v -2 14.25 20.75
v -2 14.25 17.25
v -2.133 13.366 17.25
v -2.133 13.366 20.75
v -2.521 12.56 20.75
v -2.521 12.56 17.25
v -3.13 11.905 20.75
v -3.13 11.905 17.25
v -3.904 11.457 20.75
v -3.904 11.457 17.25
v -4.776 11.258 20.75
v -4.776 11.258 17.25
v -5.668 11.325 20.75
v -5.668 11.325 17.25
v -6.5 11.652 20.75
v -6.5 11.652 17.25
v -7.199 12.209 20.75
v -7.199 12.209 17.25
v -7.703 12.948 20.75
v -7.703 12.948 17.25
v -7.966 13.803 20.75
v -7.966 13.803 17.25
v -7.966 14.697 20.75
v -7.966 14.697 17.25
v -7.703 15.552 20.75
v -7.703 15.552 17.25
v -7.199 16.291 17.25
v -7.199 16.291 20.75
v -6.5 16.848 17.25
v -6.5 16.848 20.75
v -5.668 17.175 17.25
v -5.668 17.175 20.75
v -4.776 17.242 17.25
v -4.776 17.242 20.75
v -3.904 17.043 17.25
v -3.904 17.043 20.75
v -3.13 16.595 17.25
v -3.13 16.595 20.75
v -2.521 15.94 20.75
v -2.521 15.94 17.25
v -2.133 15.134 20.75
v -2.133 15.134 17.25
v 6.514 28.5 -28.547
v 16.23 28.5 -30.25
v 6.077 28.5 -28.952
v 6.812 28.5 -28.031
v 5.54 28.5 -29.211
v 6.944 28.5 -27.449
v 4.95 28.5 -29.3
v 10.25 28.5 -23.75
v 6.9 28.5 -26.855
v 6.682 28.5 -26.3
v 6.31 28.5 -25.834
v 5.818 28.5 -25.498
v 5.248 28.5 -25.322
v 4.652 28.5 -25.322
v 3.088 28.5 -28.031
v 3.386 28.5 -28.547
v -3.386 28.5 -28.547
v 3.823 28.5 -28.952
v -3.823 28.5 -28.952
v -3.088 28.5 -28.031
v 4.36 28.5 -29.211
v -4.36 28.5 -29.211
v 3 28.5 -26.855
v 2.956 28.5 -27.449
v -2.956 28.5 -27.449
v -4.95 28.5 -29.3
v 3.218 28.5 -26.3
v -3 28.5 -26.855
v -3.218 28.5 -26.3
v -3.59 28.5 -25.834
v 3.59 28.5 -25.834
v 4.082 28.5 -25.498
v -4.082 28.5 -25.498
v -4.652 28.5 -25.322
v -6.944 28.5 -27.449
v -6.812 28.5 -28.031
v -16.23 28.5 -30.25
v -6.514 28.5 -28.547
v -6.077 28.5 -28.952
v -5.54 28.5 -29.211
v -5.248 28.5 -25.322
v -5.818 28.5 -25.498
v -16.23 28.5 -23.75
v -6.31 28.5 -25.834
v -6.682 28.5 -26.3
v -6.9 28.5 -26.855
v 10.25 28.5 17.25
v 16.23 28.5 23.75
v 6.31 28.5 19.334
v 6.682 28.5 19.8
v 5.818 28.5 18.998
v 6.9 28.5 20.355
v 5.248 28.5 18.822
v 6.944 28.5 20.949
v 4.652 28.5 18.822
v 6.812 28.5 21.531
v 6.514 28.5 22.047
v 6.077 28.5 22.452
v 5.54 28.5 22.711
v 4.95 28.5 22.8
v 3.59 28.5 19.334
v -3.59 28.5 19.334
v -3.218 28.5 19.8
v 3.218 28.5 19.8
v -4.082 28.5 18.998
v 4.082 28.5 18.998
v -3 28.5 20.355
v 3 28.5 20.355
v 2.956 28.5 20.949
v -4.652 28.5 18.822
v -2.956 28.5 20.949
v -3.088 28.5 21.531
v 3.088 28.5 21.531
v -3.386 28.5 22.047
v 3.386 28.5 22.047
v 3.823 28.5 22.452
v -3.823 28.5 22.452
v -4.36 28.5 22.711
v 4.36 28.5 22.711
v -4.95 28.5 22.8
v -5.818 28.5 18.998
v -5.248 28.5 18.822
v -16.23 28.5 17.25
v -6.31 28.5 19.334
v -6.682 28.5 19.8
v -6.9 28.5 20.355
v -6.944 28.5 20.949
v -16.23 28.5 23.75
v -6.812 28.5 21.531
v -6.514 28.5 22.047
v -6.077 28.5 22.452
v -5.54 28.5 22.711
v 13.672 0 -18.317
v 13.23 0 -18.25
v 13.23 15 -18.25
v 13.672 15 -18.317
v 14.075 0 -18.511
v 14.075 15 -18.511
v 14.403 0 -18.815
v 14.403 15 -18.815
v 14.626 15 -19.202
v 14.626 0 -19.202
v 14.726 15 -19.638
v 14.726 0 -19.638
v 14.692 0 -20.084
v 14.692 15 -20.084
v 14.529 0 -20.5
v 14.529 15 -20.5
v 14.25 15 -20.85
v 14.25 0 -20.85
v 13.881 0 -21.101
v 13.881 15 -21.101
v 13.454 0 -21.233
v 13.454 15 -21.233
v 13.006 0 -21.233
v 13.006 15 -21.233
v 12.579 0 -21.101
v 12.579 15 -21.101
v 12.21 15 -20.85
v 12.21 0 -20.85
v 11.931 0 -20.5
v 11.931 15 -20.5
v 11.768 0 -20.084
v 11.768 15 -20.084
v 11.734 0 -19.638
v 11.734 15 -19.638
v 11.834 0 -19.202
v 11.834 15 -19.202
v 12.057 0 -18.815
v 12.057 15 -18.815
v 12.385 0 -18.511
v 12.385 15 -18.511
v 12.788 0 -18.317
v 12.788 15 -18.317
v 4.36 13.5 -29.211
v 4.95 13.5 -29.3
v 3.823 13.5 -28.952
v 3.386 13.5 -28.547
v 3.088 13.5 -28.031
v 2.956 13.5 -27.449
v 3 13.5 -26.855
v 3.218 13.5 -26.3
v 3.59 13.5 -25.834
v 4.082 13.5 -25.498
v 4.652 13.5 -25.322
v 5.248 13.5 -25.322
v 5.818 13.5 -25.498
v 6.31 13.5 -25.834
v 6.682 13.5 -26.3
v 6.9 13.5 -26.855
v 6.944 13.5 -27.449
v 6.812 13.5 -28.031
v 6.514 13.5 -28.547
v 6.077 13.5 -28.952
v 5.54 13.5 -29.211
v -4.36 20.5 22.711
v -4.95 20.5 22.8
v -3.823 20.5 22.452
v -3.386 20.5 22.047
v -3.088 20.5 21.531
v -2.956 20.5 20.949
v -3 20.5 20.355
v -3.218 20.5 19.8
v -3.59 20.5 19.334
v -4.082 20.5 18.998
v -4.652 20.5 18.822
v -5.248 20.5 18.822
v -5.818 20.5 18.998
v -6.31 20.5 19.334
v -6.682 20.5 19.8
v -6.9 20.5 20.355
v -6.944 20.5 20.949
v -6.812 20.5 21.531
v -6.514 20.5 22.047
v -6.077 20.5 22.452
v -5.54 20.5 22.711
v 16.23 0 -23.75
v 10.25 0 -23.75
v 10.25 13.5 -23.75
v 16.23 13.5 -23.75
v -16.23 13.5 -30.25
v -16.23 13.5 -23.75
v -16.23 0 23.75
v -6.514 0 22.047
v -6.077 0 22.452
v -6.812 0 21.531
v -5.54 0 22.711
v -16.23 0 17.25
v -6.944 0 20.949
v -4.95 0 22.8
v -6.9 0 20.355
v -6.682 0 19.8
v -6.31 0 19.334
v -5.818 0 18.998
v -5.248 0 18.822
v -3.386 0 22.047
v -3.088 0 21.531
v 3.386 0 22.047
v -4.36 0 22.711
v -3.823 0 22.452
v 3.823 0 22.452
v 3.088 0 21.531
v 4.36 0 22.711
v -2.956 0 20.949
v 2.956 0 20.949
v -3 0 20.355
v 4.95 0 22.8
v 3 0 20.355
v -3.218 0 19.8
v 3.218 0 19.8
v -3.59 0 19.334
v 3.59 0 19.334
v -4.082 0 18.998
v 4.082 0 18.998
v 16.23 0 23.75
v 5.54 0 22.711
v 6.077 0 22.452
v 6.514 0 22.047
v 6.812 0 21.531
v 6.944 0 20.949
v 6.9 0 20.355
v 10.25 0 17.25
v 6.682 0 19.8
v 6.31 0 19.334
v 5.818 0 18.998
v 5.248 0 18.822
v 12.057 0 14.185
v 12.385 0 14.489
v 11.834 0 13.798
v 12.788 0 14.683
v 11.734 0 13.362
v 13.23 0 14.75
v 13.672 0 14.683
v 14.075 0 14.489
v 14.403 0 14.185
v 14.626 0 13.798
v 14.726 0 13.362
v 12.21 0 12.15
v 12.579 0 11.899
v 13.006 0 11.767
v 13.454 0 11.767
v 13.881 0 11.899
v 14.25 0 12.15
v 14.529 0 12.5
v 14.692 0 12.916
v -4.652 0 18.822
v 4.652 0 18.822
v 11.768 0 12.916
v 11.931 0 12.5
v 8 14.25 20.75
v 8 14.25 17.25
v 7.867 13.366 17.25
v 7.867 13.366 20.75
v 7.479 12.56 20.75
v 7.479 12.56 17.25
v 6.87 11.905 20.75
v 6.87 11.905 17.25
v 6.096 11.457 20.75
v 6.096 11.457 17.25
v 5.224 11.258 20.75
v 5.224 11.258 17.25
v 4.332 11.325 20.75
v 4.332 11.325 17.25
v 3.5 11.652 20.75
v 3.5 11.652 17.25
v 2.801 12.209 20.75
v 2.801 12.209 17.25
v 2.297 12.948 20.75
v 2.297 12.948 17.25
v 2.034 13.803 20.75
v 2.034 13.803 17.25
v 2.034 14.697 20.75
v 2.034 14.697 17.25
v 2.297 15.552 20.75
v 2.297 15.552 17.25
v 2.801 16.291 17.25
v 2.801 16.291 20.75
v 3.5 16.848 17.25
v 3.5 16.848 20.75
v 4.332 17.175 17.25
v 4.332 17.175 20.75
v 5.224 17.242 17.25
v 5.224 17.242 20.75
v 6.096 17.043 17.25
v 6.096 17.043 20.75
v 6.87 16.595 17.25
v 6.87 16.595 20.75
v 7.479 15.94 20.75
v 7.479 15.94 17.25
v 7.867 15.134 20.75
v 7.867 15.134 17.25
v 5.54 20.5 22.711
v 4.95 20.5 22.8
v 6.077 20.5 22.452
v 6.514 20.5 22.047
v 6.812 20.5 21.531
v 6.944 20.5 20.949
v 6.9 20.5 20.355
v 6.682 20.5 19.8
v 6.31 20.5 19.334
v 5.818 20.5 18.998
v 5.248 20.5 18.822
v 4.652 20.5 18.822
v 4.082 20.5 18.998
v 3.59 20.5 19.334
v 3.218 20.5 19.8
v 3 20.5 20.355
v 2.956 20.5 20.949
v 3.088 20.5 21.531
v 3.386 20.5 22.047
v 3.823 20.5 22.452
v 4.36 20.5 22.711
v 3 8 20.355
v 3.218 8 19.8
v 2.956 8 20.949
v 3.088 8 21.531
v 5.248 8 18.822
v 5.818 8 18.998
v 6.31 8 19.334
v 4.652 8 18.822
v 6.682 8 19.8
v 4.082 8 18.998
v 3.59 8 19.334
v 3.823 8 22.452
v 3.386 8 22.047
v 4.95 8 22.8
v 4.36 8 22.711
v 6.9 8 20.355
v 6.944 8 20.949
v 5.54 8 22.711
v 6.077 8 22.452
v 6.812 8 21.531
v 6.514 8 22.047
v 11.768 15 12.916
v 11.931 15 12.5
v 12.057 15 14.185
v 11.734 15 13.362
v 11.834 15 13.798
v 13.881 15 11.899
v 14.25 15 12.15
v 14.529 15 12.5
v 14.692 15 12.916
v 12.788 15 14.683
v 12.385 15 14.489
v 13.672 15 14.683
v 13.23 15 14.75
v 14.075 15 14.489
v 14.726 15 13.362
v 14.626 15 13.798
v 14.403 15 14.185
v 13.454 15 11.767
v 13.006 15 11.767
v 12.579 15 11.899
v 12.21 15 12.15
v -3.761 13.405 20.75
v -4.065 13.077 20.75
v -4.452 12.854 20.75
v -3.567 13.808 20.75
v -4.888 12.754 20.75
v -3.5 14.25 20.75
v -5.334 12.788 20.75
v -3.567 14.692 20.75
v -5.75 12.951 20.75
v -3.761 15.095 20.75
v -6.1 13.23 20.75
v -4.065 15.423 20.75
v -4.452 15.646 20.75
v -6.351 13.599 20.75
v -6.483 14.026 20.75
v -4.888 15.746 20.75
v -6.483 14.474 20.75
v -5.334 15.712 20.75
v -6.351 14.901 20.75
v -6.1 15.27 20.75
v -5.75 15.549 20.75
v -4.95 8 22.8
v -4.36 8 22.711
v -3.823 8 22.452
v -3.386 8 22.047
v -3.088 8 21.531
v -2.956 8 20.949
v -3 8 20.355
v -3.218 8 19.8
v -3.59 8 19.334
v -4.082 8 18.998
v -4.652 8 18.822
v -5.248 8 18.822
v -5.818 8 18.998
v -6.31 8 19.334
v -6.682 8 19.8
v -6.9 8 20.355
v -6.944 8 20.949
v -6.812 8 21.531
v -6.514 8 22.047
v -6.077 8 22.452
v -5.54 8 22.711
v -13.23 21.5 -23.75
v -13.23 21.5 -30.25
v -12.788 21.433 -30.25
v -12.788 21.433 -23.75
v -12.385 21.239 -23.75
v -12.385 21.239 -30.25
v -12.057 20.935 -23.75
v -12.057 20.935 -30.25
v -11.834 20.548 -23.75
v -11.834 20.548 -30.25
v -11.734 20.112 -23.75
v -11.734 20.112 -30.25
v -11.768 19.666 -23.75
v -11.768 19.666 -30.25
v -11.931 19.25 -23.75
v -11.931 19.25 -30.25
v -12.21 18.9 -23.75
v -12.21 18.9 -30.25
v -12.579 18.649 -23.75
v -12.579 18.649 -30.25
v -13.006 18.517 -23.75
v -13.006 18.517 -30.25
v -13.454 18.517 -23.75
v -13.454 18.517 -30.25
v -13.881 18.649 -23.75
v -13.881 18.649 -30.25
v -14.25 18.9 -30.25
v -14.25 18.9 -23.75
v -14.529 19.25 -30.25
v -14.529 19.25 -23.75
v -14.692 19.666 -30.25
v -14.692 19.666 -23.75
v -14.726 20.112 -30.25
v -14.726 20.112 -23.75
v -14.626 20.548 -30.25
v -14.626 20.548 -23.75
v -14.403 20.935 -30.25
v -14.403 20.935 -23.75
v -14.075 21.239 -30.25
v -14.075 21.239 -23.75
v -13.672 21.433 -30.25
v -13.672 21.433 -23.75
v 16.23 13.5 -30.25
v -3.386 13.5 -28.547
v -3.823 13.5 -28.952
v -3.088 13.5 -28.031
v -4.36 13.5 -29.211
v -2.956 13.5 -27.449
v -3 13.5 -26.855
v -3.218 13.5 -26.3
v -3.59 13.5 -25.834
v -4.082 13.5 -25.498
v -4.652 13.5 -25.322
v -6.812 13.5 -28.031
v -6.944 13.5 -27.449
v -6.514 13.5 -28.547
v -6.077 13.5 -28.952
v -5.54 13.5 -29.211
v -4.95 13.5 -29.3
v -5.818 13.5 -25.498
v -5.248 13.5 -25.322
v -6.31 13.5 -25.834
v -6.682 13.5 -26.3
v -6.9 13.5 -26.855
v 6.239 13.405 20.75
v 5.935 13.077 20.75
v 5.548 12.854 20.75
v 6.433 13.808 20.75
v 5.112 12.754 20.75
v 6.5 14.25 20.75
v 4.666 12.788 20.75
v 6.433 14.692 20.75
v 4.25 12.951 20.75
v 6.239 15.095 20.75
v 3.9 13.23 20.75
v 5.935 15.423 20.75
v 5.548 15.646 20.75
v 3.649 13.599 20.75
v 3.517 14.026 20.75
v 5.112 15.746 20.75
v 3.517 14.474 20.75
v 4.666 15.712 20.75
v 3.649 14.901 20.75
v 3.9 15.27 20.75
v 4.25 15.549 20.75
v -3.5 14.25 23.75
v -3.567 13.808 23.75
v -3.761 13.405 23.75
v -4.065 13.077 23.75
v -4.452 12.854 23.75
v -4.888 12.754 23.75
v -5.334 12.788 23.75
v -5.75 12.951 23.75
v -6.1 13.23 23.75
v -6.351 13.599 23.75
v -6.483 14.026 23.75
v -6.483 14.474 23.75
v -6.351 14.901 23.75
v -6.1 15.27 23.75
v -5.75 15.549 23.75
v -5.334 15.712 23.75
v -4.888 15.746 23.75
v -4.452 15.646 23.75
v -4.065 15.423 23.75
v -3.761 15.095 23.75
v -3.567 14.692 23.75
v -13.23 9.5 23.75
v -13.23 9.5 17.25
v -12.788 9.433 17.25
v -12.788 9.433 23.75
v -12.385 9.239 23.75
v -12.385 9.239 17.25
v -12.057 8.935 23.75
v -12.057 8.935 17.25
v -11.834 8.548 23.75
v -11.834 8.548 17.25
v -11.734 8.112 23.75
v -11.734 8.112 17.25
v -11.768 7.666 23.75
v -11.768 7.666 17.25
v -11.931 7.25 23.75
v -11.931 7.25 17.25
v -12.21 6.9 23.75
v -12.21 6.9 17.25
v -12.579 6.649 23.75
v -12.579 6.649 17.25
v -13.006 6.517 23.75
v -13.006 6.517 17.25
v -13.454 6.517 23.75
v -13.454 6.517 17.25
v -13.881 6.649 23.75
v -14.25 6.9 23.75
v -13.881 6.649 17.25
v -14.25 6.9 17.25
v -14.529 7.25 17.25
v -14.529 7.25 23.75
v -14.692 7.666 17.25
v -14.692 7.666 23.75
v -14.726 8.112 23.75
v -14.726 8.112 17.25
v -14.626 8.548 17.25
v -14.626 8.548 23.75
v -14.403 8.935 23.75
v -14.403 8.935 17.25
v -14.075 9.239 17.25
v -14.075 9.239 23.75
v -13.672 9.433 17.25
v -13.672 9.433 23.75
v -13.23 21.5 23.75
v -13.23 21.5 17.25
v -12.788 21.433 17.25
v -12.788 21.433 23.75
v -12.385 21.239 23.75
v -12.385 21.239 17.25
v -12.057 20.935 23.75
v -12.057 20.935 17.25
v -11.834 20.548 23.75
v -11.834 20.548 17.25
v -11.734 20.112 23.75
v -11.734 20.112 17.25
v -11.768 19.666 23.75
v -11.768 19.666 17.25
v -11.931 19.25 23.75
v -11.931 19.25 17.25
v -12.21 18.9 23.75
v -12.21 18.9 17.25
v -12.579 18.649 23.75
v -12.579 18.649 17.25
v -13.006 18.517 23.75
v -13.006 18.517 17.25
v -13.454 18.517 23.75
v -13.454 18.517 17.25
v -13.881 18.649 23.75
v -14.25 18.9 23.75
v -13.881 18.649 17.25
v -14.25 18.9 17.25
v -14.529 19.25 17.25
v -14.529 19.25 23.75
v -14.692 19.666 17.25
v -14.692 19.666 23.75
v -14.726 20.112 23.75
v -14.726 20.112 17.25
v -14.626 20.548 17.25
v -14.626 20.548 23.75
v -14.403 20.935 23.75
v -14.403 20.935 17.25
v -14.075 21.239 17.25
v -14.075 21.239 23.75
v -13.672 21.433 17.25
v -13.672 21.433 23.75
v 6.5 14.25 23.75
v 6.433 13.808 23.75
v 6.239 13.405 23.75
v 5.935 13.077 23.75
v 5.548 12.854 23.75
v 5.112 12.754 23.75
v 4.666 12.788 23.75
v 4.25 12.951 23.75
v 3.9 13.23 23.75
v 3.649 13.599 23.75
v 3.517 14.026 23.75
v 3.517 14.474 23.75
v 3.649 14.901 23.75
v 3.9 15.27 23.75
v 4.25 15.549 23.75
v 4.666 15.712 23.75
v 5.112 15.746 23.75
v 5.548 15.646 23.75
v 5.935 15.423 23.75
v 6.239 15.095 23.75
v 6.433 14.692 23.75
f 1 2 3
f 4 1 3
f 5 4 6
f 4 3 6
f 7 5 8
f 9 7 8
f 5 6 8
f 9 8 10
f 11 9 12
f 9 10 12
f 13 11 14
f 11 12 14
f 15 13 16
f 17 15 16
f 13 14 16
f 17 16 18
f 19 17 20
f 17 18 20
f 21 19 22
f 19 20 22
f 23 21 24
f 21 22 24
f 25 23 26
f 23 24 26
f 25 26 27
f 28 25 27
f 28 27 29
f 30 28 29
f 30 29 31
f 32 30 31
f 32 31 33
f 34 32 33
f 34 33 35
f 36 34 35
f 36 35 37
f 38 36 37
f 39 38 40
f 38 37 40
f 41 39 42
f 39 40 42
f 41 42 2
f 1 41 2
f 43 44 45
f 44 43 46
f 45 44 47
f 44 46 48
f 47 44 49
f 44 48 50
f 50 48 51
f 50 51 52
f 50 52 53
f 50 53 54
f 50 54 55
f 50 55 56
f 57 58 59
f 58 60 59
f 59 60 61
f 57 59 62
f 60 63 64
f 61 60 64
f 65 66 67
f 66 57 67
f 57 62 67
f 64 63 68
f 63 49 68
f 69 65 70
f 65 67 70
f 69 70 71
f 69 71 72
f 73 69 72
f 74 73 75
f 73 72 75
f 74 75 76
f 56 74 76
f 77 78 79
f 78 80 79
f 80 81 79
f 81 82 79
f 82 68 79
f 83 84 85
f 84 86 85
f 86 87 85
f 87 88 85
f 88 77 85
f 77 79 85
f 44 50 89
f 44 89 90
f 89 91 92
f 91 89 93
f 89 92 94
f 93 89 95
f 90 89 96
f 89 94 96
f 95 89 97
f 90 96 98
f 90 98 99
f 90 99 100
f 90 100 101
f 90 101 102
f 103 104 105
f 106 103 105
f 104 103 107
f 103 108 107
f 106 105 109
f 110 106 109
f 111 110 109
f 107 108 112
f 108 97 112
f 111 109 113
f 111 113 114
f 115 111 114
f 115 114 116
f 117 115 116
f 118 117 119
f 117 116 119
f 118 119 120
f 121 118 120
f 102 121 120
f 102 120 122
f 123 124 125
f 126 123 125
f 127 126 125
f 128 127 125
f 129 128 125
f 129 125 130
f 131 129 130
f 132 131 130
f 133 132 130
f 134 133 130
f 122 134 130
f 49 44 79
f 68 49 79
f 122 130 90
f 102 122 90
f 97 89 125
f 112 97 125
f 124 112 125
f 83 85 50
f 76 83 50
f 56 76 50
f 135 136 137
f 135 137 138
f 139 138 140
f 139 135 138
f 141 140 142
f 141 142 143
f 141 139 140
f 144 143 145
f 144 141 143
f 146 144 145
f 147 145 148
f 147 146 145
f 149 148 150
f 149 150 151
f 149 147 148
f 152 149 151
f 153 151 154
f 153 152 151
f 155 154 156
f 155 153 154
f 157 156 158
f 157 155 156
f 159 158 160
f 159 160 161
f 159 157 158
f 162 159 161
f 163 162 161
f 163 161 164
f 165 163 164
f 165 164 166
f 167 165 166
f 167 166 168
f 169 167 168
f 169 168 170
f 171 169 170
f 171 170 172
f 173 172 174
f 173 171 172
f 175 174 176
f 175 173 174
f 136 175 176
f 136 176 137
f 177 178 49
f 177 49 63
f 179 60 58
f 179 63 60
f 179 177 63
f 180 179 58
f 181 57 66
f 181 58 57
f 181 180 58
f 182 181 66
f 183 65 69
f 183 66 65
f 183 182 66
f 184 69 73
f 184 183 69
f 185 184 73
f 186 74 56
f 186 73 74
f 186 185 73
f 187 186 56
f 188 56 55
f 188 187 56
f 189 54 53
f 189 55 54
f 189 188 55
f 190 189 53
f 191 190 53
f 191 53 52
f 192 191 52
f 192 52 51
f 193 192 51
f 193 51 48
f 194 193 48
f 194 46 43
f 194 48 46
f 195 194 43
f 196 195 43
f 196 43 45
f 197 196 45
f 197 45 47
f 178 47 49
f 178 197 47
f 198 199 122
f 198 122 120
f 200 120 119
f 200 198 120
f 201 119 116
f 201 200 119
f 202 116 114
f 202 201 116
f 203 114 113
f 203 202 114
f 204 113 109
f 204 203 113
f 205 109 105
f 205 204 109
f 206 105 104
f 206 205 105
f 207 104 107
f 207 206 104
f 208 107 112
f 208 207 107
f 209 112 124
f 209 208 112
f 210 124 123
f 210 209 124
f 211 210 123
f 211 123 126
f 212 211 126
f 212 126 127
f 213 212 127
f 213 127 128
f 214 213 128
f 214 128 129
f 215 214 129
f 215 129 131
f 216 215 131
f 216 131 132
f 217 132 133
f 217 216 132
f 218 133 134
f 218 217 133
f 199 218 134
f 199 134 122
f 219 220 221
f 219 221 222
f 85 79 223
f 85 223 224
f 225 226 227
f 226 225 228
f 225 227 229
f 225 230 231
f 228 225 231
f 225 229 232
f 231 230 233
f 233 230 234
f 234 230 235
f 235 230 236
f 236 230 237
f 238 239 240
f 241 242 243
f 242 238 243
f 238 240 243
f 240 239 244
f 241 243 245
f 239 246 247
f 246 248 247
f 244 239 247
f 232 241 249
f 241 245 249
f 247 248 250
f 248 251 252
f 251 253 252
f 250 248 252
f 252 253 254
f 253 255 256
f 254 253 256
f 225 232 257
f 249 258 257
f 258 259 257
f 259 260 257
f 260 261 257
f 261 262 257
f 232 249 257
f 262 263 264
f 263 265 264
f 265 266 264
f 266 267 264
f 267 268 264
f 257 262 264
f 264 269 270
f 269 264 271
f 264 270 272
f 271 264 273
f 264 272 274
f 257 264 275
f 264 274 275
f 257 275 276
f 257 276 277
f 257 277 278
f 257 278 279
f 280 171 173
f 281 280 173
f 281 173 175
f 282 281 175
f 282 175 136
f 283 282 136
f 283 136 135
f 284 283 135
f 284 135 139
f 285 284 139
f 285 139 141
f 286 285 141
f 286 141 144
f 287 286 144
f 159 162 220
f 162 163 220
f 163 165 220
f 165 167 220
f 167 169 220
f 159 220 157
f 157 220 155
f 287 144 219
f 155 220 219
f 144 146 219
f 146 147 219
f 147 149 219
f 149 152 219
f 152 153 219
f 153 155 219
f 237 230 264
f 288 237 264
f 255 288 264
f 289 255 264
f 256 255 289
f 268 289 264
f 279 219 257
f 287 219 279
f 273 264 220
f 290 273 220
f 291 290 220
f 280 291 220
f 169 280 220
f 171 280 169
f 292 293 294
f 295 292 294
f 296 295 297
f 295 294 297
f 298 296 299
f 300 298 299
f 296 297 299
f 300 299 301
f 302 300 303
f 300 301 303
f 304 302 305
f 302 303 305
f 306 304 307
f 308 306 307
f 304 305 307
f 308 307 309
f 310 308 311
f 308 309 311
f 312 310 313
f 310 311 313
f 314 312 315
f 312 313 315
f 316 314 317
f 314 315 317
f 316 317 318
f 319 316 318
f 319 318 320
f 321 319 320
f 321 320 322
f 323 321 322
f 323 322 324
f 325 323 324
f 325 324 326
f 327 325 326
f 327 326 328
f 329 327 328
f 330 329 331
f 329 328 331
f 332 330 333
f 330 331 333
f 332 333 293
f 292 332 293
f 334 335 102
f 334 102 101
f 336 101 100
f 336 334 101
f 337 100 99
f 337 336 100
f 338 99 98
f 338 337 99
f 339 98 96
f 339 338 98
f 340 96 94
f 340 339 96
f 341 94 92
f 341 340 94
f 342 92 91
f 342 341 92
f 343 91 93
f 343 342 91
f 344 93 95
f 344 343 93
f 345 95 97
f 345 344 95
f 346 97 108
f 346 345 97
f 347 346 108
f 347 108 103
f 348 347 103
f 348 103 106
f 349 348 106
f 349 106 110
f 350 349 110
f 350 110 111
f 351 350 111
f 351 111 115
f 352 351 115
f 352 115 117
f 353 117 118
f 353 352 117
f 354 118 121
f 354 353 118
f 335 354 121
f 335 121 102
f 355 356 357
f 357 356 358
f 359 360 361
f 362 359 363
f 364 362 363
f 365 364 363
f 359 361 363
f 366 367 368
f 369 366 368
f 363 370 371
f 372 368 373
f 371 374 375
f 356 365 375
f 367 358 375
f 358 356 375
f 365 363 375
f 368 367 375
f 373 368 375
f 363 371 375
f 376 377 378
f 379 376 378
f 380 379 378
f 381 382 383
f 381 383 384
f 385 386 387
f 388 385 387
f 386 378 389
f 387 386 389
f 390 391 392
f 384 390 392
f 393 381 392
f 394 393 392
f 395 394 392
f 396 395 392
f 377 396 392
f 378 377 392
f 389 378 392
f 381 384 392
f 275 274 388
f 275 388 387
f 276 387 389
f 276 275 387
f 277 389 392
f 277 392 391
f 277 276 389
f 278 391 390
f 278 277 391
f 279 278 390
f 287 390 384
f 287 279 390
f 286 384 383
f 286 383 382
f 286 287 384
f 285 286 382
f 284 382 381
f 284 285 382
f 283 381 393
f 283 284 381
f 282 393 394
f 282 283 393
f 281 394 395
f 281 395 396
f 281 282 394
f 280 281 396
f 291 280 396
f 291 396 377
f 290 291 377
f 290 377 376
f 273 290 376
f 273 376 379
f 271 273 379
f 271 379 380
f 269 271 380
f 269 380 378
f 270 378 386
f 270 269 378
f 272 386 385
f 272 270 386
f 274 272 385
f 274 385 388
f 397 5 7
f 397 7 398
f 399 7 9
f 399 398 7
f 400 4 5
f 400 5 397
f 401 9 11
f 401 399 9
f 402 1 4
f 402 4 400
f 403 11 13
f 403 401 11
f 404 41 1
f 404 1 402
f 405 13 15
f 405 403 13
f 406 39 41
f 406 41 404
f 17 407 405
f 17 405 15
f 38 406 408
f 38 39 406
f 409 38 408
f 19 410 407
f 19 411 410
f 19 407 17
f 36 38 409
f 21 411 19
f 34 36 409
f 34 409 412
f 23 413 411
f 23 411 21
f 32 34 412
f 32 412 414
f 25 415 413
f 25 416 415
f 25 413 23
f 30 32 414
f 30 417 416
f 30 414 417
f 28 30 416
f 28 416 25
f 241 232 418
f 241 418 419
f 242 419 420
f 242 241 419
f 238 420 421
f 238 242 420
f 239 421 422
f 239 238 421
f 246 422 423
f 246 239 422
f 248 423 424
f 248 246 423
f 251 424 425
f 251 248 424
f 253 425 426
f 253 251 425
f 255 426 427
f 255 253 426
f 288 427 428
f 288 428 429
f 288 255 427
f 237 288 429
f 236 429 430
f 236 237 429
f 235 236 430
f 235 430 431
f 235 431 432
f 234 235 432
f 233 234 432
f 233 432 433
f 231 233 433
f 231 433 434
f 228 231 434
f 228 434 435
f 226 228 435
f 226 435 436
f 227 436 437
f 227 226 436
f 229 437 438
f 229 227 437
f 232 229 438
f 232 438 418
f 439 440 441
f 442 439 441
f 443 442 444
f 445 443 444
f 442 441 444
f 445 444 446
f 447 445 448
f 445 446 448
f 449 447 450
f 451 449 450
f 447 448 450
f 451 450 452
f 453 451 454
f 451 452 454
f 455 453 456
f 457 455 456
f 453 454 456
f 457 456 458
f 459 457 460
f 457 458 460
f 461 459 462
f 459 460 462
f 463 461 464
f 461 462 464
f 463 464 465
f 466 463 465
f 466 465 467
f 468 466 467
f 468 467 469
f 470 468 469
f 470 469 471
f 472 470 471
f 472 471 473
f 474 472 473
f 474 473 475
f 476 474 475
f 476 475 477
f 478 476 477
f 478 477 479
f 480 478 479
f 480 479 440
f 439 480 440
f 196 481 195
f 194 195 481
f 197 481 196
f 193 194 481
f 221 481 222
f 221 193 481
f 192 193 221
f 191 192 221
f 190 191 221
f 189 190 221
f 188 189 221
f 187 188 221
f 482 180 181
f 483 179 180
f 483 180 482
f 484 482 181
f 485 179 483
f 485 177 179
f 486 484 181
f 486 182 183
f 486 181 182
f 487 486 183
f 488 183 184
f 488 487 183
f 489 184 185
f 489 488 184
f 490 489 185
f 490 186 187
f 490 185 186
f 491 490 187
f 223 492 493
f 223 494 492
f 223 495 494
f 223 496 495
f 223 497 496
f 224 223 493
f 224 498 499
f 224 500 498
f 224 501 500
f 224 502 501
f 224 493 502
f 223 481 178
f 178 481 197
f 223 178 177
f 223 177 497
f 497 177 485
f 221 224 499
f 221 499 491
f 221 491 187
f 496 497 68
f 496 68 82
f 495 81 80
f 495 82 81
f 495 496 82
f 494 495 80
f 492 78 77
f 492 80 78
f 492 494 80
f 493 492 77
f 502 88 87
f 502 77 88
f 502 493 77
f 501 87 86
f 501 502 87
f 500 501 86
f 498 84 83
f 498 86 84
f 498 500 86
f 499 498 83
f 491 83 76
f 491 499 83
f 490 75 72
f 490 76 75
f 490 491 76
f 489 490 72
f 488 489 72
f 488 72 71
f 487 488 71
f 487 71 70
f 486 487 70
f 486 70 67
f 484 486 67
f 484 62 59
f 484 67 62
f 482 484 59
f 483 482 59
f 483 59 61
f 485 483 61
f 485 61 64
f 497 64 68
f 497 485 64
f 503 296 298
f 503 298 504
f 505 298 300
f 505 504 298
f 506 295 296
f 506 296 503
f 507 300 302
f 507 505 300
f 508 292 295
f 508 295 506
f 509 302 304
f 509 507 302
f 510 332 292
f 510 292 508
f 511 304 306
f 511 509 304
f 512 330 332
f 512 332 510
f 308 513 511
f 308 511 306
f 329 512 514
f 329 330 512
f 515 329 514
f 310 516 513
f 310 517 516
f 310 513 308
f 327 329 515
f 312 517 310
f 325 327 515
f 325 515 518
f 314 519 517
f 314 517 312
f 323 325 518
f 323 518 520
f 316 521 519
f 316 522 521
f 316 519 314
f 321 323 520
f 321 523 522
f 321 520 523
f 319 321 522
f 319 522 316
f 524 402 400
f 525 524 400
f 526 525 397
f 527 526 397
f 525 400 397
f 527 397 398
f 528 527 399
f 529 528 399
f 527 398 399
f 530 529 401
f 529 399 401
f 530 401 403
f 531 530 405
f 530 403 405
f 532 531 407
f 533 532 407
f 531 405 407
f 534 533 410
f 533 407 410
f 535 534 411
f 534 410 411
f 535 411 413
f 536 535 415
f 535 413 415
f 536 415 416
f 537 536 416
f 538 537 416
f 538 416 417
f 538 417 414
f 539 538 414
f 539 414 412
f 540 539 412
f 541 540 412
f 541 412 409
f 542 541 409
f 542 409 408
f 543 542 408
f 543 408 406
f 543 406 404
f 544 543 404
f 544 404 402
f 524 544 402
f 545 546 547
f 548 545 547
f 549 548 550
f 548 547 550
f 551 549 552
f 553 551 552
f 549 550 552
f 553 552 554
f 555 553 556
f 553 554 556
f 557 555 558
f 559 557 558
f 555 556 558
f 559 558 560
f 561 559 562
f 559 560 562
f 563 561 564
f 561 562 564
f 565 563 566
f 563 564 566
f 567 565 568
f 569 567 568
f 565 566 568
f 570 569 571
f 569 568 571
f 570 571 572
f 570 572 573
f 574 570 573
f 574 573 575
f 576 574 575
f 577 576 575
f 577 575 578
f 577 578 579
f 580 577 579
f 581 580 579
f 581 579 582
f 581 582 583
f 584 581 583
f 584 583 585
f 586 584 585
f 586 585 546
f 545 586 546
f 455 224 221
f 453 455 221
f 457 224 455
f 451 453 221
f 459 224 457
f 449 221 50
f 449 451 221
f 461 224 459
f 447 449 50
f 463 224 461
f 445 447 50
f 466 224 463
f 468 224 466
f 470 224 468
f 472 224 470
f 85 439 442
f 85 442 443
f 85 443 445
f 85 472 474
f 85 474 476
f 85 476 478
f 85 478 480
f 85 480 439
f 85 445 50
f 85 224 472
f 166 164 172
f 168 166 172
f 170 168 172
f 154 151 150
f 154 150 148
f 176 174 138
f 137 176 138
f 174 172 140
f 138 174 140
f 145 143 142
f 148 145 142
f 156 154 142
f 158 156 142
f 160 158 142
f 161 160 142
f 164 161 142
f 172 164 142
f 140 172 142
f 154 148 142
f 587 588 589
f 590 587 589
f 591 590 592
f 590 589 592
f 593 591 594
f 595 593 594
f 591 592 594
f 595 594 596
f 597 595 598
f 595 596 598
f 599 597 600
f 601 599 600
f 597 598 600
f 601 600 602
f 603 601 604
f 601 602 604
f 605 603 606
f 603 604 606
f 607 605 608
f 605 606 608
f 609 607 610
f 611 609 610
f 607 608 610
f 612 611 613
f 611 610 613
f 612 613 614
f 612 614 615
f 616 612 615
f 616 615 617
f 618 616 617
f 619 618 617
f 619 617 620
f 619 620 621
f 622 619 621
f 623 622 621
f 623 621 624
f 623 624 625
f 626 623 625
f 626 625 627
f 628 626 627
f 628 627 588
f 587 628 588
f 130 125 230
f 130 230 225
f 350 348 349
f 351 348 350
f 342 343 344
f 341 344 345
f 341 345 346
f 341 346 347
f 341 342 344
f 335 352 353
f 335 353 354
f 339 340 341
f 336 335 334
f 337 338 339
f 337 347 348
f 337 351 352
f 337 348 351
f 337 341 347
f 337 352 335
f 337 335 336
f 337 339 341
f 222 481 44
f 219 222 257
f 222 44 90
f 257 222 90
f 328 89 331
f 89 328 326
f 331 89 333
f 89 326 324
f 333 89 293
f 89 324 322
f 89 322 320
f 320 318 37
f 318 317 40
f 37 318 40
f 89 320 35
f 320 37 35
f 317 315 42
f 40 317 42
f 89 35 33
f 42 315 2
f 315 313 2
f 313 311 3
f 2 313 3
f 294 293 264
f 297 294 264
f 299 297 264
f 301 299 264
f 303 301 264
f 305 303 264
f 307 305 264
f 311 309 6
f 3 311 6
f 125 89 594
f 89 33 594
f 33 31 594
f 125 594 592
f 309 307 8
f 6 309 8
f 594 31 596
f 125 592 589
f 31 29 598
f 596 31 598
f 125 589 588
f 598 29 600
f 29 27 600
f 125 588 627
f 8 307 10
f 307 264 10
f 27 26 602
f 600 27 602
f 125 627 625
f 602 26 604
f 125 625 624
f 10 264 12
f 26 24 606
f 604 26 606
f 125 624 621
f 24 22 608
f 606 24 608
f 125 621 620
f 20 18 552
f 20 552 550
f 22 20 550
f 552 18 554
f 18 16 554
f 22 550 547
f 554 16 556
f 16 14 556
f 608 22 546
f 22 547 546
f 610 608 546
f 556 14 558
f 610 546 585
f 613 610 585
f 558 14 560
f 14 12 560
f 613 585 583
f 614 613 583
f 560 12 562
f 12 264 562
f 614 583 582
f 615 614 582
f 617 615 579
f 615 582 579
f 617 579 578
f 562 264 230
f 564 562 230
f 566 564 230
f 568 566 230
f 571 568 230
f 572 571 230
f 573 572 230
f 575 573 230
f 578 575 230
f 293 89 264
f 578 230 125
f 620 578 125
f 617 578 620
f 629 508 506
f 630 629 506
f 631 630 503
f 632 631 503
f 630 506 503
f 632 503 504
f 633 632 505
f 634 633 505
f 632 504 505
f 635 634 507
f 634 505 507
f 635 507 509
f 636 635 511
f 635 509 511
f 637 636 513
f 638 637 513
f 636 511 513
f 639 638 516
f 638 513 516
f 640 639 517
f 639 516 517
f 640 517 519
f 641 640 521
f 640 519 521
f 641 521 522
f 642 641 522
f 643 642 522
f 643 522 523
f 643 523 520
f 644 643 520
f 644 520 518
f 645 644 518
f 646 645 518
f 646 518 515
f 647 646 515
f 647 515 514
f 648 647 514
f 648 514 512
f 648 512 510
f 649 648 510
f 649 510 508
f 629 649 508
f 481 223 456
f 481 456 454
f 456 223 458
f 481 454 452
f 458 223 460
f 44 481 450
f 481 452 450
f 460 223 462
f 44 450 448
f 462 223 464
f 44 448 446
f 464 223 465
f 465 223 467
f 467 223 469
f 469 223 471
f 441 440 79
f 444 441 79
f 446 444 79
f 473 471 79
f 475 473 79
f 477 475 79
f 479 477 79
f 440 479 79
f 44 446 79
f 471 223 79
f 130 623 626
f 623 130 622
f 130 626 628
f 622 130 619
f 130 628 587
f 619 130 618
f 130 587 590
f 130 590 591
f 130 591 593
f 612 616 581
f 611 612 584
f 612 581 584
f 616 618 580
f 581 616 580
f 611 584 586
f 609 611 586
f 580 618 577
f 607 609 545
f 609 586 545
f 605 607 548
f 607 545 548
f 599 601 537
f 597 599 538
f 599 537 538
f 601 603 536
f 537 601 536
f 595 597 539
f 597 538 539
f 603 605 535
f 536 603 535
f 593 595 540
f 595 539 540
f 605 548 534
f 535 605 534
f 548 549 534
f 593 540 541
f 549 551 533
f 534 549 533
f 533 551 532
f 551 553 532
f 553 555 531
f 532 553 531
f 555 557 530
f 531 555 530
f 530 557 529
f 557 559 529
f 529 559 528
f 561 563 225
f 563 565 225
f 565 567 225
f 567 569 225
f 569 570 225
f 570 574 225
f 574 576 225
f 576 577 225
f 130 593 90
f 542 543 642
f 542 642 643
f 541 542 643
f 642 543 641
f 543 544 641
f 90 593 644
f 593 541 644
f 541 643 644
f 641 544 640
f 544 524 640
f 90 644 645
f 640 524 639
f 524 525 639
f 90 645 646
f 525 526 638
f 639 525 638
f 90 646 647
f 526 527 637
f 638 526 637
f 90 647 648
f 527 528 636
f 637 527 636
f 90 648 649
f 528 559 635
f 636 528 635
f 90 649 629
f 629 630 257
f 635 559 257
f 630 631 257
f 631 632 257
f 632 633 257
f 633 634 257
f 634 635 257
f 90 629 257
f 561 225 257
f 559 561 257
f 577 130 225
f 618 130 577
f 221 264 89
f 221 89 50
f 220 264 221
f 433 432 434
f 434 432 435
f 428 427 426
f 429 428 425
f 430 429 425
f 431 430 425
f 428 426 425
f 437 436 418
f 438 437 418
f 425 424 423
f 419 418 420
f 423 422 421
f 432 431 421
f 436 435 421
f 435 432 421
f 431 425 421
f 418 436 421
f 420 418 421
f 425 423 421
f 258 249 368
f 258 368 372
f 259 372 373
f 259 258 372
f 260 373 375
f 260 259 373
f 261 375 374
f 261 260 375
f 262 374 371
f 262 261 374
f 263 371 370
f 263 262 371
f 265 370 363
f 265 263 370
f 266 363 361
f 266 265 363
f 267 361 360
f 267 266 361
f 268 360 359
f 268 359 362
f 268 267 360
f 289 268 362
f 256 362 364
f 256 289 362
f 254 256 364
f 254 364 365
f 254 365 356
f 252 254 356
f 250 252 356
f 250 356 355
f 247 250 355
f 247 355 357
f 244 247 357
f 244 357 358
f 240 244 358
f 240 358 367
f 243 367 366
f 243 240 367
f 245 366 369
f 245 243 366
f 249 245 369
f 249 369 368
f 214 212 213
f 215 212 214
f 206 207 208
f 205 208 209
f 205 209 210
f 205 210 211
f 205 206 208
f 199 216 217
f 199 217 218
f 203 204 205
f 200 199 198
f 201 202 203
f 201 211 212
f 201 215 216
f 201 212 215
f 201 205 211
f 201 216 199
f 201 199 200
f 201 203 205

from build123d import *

# Parameters (mm, degrees)
BOSS_EXTRUDE1_DEPTH = 28.5
SKETCH2_4_R         = 1.5
CUT_EXTRUDE1_DEPTH  = 15
SKETCH3_W           = 6.5
SKETCH3_H           = 15
BOSS_EXTRUDE2_DEPTH = 32.46
SKETCH2_5_R         = 2
CUT_EXTRUDE2_DEPTH  = 94.46
SKETCH2_6_R         = 2
CUT_EXTRUDE4_DEPTH  = 8
CUT_EXTRUDE5_START  = -8
SKETCH5_R           = 2
CUT_EXTRUDE5_DEPTH  = 8
SKETCH4_R           = 1.5
CUT_EXTRUDE3_DEPTH  = 10
SKETCH4_3_R         = 3
SKETCH4_3_R_2       = 1.5
CUT_EXTRUDE6_DEPTH  = 3.5
CUT_EXTRUDE7_REACH  = 54.735
SKETCH11_W          = 41
SKETCH11_H          = 28.5
SKETCH12_R          = 1.5
CUT_EXTRUDE8_DEPTH  = 64


with BuildPart() as part:
    # Sketch2 → Boss-Extrude1 (new body)
    with BuildSketch(Plane(origin=(0, 0, 0), x_dir=(1, 0, 0), z_dir=(0, 1, 0))):
        Polygon((-10.25, 23.75), (-16.23, 23.75), (-16.23, -23.75), (16.23, -23.75), (16.23, 23.75), (10.25, 23.75), (10.25, -17.25), (-10.25, -17.25), align=None)
    extrude(amount=BOSS_EXTRUDE1_DEPTH)

    # Sketch2<4> → Cut-Extrude1 (cut)
    with BuildSketch(Plane(origin=(0, 0, 0), x_dir=(1, 0, 0), z_dir=(0, 1, 0))):
        with Locations((-13.23, 19.75)):
            Circle(SKETCH2_4_R)
        with Locations((13.23, 19.75)):
            Circle(SKETCH2_4_R)
        with Locations((13.23, -13.25)):
            Circle(SKETCH2_4_R)
        with Locations((-13.23, -13.25)):
            Circle(SKETCH2_4_R)
    extrude(amount=CUT_EXTRUDE1_DEPTH, mode=Mode.SUBTRACT)

    # Sketch3 → Boss-Extrude2 (add)
    with BuildSketch(Plane.ZY.offset(16.23)):
        with Locations((-27, 21)):
            Rectangle(SKETCH3_W, SKETCH3_H)
    extrude(amount=-BOSS_EXTRUDE2_DEPTH)

    # Sketch2<5> → Cut-Extrude2 (cut)
    with BuildSketch(Plane(origin=(0, 0, 0), x_dir=(1, 0, 0), z_dir=(0, 1, 0))):
        with Locations((-4.95, 27.3)):
            Circle(SKETCH2_5_R)
        with Locations((4.95, 27.3)):
            Circle(SKETCH2_5_R)
    extrude(amount=CUT_EXTRUDE2_DEPTH, mode=Mode.SUBTRACT)

    # Sketch2<6> → Cut-Extrude4 (cut)
    with BuildSketch(Plane(origin=(0, 0, 0), x_dir=(1, 0, 0), z_dir=(0, 1, 0))):
        with Locations((4.95, -20.8)):
            Circle(SKETCH2_6_R)
        with Locations((-4.95, -20.8)):
            Circle(SKETCH2_6_R)
    extrude(amount=CUT_EXTRUDE4_DEPTH, mode=Mode.SUBTRACT)

    # Sketch5 → Cut-Extrude5 (cut)
    with BuildSketch(Plane(origin=(0, 28.5, 0), x_dir=(1, 0, 0), z_dir=(0, 1, 0)).offset(CUT_EXTRUDE5_START)):
        with Locations((-4.95, -20.8)):
            Circle(SKETCH5_R)
        with Locations((4.95, -20.8)):
            Circle(SKETCH5_R)
    extrude(amount=CUT_EXTRUDE5_DEPTH, mode=Mode.SUBTRACT)

    # Sketch4 → Cut-Extrude3 (cut)
    with BuildSketch(Plane(origin=(0, 0, 17.25), x_dir=(-1, 0, 0), z_dir=(0, 0, -1))):
        with Locations((-5, 14.25)):
            Circle(SKETCH4_R)
        with Locations((5, 14.25)):
            Circle(SKETCH4_R)
    extrude(amount=-CUT_EXTRUDE3_DEPTH, mode=Mode.SUBTRACT)

    # Sketch4<3> → Cut-Extrude6 (cut)
    # profile 1 of 2: a face of its own
    with BuildSketch(Plane(origin=(0, 0, 17.25), x_dir=(-1, 0, 0), z_dir=(0, 0, -1))):
        with Locations((-5, 14.25)):
            Circle(SKETCH4_3_R)
        with Locations((-5, 14.25)):
            Circle(SKETCH4_3_R_2, mode=Mode.SUBTRACT)
    # profile 2 of 2: a face of its own
    with BuildSketch(Plane(origin=(0, 0, 17.25), x_dir=(-1, 0, 0), z_dir=(0, 0, -1))):
        with Locations((5, 14.25)):
            Circle(SKETCH4_3_R)
        with Locations((5, 14.25)):
            Circle(SKETCH4_3_R_2, mode=Mode.SUBTRACT)
    extrude(amount=-CUT_EXTRUDE6_DEPTH, mode=Mode.SUBTRACT)

    # Sketch11 → Cut-Extrude7 (cut, up to next)
    with BuildSketch(Plane.ZY.offset(16.23), mode=Mode.PRIVATE) as cut_extrude7_sk1:
        with Locations((-3.25, 14.25)):
            Rectangle(SKETCH11_W, SKETCH11_H)
    cut_extrude7_tool1 = extrude(cut_extrude7_sk1.sketch, amount=-CUT_EXTRUDE7_REACH, mode=Mode.PRIVATE) & part.part
    add(cut_extrude7_tool1.solids().sort_by_distance((-16.23, 14.25, -3.25))[0], mode=Mode.SUBTRACT)

    # Sketch12 → Cut-Extrude8 (cut)
    with BuildSketch(Plane(origin=(0, 0, -30.25), x_dir=(-1, 0, 0), z_dir=(0, 0, -1))):
        with Locations((13.23, 20)):
            Circle(SKETCH12_R)
        with Locations((13.23, 8)):
            Circle(SKETCH12_R)
    extrude(amount=-CUT_EXTRUDE8_DEPTH, mode=Mode.SUBTRACT)


solid = part.part
